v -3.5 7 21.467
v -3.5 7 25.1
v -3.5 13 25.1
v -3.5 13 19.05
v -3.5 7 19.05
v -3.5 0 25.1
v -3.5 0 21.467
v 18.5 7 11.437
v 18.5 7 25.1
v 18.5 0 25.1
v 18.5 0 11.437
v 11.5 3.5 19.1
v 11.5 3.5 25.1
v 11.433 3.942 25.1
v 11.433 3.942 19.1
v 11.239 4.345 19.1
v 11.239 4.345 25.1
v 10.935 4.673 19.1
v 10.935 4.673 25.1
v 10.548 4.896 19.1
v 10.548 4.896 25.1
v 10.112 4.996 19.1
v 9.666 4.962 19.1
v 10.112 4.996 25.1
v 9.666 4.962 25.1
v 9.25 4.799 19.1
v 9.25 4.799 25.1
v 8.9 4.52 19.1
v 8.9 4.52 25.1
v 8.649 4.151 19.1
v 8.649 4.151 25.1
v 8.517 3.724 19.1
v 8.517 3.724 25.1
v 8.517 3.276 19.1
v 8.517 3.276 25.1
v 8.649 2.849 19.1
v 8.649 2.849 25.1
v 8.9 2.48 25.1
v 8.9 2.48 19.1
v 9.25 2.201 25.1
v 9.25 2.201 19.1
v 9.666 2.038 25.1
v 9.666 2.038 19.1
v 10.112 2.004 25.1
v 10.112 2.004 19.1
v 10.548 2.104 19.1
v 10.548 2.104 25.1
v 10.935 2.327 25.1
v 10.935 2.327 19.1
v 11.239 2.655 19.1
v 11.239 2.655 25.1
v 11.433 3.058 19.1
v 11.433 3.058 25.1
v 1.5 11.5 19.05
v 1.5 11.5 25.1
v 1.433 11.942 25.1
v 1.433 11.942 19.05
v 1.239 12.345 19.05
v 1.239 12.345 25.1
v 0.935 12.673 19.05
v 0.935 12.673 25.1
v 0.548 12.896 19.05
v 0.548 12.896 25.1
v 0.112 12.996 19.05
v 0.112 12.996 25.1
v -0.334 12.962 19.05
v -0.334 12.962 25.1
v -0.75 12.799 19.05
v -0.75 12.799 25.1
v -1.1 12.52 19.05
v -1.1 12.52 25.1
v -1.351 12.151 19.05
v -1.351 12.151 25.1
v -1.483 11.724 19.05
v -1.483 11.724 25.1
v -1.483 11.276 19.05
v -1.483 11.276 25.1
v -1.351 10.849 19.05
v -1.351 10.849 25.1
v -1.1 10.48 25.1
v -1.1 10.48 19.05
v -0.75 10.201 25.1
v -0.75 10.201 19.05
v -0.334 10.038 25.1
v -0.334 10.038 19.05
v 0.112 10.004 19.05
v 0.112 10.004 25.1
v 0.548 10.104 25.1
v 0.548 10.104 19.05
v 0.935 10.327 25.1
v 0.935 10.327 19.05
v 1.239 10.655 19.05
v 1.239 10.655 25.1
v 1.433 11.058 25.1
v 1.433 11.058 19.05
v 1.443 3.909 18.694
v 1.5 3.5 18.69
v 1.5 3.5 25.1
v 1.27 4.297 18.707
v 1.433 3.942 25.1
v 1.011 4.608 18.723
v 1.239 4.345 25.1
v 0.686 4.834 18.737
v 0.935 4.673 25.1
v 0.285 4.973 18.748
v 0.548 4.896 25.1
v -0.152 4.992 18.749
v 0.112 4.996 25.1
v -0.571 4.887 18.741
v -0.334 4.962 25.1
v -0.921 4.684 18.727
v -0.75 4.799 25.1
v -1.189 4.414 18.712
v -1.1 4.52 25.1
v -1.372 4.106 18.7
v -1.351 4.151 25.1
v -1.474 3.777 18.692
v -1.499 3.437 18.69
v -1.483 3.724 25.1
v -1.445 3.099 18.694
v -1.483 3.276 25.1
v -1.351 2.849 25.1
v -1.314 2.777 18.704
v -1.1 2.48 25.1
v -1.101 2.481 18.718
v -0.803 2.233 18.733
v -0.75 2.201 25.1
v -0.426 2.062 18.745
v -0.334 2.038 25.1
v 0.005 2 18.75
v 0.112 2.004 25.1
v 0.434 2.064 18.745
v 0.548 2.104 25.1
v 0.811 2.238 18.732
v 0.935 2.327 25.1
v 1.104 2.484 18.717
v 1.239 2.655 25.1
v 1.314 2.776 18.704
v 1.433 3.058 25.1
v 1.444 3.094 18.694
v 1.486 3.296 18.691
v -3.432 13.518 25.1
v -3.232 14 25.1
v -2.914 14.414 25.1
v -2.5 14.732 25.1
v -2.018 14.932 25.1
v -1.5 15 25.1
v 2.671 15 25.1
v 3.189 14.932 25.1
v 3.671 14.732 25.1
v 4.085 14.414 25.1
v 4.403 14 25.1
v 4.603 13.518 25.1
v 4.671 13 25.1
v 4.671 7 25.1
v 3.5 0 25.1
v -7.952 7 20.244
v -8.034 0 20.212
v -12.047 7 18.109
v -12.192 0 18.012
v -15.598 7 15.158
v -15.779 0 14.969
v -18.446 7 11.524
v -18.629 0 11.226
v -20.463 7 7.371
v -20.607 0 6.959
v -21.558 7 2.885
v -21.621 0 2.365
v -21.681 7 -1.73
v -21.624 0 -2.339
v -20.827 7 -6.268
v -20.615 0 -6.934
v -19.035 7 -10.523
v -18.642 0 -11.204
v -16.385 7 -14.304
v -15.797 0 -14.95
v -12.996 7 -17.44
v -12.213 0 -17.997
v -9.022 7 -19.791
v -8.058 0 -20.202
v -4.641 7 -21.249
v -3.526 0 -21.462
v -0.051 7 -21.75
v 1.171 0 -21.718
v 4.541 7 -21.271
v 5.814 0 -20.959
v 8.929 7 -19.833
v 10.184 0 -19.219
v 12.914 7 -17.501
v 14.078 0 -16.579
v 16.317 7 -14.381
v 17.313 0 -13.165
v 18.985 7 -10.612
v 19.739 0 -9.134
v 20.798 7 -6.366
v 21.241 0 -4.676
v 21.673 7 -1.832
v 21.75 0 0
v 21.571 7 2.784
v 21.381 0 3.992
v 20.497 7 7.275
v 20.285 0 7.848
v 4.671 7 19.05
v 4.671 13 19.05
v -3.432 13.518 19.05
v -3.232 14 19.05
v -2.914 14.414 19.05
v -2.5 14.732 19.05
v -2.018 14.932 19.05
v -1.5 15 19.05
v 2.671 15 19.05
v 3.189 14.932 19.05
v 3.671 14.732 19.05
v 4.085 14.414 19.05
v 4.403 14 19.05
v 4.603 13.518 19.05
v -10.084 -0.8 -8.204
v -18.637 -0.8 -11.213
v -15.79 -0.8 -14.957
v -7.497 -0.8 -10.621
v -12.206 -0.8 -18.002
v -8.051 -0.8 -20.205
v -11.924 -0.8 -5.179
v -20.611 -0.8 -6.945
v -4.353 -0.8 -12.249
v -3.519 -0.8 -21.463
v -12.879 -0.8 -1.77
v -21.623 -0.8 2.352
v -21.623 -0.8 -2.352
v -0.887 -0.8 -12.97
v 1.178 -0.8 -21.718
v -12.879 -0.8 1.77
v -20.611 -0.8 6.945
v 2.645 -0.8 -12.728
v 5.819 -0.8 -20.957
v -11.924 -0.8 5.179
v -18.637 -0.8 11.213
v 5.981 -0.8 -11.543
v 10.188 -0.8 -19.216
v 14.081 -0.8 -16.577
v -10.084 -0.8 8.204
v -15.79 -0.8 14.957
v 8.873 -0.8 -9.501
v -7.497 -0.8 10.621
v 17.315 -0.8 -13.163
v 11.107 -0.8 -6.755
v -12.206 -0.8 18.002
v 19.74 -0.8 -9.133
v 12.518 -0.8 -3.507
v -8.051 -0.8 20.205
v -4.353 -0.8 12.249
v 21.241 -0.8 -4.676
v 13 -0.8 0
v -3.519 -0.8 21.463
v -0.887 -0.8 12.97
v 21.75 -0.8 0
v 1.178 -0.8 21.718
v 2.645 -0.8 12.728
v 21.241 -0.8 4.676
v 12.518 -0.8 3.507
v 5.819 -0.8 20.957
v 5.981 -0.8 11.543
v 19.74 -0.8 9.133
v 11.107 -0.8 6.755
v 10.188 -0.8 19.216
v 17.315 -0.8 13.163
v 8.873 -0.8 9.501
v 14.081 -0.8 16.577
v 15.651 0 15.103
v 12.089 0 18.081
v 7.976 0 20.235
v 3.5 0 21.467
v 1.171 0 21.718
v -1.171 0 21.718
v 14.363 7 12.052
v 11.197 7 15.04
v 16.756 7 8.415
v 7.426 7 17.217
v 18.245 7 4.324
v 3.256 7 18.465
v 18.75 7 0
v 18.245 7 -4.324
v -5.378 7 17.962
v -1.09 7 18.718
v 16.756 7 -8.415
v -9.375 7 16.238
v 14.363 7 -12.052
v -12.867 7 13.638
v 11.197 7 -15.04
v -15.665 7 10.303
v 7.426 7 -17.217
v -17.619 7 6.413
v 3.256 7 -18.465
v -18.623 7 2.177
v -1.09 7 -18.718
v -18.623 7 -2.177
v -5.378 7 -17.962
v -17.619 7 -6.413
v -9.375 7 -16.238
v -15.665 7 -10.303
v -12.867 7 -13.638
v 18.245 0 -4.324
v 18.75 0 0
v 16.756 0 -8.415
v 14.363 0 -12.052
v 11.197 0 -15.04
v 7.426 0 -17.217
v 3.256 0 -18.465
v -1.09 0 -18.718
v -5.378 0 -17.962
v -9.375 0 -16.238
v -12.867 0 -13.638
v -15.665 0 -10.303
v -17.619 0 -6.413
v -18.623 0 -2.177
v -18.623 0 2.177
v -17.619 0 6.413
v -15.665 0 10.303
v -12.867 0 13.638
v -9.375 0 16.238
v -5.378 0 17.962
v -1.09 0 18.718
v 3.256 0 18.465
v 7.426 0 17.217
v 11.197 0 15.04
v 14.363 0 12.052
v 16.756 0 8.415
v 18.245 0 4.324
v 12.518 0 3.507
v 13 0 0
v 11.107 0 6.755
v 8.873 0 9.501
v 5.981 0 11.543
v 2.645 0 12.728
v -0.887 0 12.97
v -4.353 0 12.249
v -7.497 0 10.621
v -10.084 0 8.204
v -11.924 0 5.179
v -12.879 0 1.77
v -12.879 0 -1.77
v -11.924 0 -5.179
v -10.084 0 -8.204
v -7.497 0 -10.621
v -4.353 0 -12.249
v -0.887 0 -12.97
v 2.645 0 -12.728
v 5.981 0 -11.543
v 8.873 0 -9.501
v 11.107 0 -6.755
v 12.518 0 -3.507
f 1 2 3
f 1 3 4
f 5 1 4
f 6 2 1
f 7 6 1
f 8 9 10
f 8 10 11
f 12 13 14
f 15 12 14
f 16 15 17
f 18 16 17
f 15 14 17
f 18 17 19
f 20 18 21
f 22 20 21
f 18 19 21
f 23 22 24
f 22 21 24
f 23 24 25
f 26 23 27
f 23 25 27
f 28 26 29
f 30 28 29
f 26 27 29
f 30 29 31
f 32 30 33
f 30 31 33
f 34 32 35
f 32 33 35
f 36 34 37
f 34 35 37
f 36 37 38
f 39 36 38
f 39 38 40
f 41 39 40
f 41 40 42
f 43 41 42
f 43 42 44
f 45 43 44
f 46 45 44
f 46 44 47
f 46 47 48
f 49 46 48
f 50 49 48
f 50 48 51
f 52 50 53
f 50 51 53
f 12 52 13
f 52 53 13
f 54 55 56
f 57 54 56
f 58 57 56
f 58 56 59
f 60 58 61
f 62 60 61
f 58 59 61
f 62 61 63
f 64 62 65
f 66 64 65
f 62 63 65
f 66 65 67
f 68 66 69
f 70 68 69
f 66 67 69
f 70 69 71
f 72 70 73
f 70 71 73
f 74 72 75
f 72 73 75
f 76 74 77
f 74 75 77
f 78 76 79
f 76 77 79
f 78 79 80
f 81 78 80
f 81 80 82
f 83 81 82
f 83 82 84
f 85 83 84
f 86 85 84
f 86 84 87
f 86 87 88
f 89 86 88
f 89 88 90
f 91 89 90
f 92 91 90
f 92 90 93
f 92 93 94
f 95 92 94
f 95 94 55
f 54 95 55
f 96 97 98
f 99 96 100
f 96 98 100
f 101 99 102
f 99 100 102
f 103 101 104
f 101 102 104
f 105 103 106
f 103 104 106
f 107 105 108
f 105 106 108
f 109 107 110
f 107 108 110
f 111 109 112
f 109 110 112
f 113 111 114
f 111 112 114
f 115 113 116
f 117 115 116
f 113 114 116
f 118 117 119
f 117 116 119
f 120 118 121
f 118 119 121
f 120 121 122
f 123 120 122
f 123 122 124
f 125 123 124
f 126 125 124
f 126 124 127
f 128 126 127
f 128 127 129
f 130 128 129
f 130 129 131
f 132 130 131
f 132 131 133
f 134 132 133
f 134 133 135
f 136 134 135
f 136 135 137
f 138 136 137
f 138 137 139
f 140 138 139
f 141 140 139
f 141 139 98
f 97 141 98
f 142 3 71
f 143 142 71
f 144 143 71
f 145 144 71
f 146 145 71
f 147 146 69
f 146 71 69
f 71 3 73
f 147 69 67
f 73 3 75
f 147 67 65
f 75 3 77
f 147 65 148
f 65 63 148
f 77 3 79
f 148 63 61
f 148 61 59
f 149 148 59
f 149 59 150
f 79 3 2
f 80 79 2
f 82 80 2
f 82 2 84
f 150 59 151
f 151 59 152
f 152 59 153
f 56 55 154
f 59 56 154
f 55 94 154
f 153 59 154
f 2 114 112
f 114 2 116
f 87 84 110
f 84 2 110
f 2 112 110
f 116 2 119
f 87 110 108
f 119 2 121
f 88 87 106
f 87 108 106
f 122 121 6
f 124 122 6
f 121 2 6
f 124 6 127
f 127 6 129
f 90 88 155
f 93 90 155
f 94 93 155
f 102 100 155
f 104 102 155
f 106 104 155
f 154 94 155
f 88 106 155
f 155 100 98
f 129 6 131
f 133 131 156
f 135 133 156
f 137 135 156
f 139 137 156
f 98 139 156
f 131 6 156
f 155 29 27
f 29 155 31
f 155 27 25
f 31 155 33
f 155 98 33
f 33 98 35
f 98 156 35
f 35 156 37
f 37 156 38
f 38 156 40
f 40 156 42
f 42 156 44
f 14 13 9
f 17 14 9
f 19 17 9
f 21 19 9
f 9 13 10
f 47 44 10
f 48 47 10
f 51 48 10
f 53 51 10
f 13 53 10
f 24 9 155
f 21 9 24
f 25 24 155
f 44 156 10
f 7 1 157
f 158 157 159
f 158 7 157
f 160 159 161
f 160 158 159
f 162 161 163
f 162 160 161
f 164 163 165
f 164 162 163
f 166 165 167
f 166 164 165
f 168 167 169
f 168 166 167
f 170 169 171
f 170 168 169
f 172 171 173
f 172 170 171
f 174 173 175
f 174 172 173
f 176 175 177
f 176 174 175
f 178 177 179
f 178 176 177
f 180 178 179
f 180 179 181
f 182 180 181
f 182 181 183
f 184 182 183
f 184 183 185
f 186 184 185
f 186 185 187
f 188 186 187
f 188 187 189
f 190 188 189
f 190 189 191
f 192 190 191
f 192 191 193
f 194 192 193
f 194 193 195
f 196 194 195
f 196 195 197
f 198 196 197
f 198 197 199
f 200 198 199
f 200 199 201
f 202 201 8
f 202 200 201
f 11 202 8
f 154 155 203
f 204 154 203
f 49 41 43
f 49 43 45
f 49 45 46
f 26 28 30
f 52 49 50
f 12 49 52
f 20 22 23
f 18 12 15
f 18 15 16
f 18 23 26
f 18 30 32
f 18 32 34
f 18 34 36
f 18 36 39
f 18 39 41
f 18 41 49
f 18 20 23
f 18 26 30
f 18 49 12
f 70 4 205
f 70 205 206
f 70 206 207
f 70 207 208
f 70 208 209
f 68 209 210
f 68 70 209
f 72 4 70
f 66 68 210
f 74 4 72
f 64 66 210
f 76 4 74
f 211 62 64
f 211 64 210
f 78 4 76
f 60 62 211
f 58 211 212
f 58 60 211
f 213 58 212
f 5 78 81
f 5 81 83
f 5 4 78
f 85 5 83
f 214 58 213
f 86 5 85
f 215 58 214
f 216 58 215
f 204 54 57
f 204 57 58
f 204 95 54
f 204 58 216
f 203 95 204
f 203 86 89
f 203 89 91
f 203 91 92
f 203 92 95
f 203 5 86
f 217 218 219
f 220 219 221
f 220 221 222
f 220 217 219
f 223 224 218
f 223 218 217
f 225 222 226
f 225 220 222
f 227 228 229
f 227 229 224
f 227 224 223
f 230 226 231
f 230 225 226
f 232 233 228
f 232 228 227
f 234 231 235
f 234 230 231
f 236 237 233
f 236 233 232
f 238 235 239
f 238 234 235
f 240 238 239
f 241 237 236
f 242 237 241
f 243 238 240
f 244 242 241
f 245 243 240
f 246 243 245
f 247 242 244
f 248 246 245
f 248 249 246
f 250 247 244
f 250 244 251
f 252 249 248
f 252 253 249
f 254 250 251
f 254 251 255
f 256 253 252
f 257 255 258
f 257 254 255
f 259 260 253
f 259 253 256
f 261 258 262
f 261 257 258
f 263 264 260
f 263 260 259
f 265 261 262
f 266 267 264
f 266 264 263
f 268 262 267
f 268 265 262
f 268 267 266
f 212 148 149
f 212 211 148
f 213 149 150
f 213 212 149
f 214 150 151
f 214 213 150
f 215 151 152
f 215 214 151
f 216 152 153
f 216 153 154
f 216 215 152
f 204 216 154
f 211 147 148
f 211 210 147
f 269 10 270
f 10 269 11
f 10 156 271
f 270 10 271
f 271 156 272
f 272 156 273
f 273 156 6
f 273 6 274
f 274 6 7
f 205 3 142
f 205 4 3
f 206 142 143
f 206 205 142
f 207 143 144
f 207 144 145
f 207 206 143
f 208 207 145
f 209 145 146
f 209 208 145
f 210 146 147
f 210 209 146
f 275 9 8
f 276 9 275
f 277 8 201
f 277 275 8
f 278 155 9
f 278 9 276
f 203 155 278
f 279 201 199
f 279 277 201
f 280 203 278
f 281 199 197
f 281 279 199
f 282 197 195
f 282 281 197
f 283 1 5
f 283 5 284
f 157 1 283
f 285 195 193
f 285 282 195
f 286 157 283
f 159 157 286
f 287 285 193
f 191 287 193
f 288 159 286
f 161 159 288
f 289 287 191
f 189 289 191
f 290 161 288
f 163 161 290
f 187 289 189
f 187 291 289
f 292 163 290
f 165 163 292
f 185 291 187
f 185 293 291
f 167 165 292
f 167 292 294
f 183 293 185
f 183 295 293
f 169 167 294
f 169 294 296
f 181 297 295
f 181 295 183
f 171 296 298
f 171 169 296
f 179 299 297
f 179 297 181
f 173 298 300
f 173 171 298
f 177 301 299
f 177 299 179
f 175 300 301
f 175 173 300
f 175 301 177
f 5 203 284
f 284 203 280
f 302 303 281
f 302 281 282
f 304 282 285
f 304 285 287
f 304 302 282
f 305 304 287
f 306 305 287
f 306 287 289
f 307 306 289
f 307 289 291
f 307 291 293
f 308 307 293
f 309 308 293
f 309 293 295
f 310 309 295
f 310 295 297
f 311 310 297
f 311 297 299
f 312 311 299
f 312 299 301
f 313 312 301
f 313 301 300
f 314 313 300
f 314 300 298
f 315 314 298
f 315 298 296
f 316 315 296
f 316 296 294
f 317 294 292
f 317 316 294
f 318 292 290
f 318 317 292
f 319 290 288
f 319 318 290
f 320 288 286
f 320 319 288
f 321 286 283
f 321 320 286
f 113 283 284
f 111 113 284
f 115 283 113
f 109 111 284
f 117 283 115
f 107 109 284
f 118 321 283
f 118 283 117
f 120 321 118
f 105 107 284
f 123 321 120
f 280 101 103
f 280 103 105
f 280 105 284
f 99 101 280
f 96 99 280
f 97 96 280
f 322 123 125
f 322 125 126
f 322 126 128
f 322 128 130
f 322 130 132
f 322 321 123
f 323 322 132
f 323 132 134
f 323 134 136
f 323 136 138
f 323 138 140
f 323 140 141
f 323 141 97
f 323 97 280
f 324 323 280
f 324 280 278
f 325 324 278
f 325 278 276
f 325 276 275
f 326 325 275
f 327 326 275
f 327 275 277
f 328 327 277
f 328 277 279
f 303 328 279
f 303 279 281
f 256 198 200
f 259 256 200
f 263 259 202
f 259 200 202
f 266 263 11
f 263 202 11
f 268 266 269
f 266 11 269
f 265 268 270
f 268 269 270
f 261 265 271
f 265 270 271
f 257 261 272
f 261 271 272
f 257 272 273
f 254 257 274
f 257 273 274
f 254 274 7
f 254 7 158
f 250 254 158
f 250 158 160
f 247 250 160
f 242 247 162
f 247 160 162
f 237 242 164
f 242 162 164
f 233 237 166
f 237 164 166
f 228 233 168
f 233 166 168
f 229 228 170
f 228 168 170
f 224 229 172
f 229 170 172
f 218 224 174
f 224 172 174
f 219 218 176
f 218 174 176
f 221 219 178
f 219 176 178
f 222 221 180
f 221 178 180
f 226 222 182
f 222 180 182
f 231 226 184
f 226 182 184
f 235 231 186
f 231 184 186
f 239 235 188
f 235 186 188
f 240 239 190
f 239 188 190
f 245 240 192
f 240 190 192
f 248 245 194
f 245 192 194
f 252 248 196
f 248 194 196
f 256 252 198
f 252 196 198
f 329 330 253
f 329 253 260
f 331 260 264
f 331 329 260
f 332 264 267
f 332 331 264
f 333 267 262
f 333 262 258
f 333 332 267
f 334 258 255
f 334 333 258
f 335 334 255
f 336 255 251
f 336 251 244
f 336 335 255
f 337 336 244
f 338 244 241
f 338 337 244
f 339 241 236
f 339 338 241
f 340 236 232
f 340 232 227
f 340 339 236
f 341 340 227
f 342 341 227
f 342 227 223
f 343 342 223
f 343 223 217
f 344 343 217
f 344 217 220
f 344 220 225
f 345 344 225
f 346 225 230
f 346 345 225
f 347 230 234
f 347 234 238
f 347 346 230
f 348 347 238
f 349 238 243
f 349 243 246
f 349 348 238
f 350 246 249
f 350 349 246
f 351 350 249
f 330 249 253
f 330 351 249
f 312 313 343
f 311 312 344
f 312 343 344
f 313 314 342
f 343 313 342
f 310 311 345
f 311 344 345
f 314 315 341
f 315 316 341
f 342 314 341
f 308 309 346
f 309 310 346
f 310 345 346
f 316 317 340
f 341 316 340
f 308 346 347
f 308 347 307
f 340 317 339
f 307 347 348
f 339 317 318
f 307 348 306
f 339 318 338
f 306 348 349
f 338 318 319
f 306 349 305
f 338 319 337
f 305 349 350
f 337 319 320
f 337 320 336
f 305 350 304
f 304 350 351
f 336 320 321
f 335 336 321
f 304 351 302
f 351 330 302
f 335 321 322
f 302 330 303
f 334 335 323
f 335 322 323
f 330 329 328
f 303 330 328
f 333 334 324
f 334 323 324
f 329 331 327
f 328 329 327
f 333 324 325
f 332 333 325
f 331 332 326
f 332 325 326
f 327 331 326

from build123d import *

# Parameters (mm, degrees)
SKETCH1_R           = 18.75
BOSS_EXTRUDE1_DEPTH = 7
SKETCH2_R           = 1.5
CUT_EXTRUDE1_DEPTH  = 7
SKETCH3_R           = 21.75
SKETCH3_R_2         = 13
BOSS_EXTRUDE2_DEPTH = 0.8
SKETCH5_W           = 3.633456263
SKETCH5_H           = 7
BOSS_EXTRUDE4_DEPTH = 15
BOSS_EXTRUDE5_DEPTH = 7
SKETCH7_R           = 1.5
CUT_EXTRUDE2_DEPTH  = 6
SKETCH8_W           = 8.171206901
SKETCH8_H           = 6.05024239
BOSS_EXTRUDE6_DEPTH = 8
SKETCH9_R           = 1.5
CUT_EXTRUDE3_DEPTH  = 10
FILLET1_R           = 2


with BuildPart() as part:
    # Sketch1 → Boss-Extrude1 (new body)
    with BuildSketch(Plane(origin=(0, 0, 0), x_dir=(1, 0, 0), z_dir=(0, 1, 0))):
        with BuildLine():
            Line((3.5, -25.1), (-3.5, -25.1))
            Line((-3.5, -25.1), (-3.5, -21.466543737))
            ThreePointArc((-3.5, -21.466543737), (0, 21.75), (3.5, -21.466543737))
            Line((3.5, -21.466543737), (3.5, -25.1))
        make_face()
        Circle(SKETCH1_R, mode=Mode.SUBTRACT)
    extrude(amount=BOSS_EXTRUDE1_DEPTH)

    # Sketch2 → Cut-Extrude1 (cut)
    with BuildSketch(Plane.XY.offset(25.1)):
        with Locations((0, 3.5)):
            Circle(SKETCH2_R)
    extrude(amount=-CUT_EXTRUDE1_DEPTH, mode=Mode.SUBTRACT)

    # Sketch3 → Boss-Extrude2 (add)
    with BuildSketch(Plane.XZ):
        Circle(SKETCH3_R)
        Circle(SKETCH3_R_2, mode=Mode.SUBTRACT)
    extrude(amount=BOSS_EXTRUDE2_DEPTH)

    # Sketch5 → Boss-Extrude4 (add)
    with BuildSketch(Plane(origin=(3.5, 0, 0), x_dir=(0, 0, -1), z_dir=(1, 0, 0))):
        with Locations((-23.283271869, 3.5)):
            Rectangle(SKETCH5_W, SKETCH5_H)
    extrude(amount=BOSS_EXTRUDE4_DEPTH)

    # Sketch6 → Boss-Extrude5 (add)
    with BuildSketch(Plane(origin=(0, 7, 0), x_dir=(1, 0, 0), z_dir=(0, 1, 0))):
        Polygon((18.5, -25.1), (18.5, -11.437329234), (3.5, -21.466543737), (3.5, -25.1), align=None)
    extrude(amount=-BOSS_EXTRUDE5_DEPTH)

    # Sketch7 → Cut-Extrude2 (cut)
    with BuildSketch(Plane.XY.offset(25.1)):
        with Locations((10, 3.5)):
            Circle(SKETCH7_R)
    extrude(amount=-CUT_EXTRUDE2_DEPTH, mode=Mode.SUBTRACT)

    # Sketch8 → Boss-Extrude6 (add)
    with BuildSketch(Plane(origin=(0, 7, 0), x_dir=(1, 0, 0), z_dir=(0, 1, 0))):
        with Locations((0.585603451, -22.074878805)):
            Rectangle(SKETCH8_W, SKETCH8_H)
    extrude(amount=BOSS_EXTRUDE6_DEPTH)

    # Sketch9 → Cut-Extrude3 (cut)
    with BuildSketch(Plane.XY.offset(25.1)):
        with Locations((0, 11.5)):
            Circle(SKETCH9_R)
    extrude(amount=-CUT_EXTRUDE3_DEPTH, mode=Mode.SUBTRACT)

    # Fillet1
    fillet1_edges = [part.edges().sort_by_distance(p)[0] for p in [
        (-3.5, 15, 22.074878805),
        (4.671206901, 15, 22.074878805),
    ]]
    fillet(fillet1_edges, radius=FILLET1_R)


solid = part.part
